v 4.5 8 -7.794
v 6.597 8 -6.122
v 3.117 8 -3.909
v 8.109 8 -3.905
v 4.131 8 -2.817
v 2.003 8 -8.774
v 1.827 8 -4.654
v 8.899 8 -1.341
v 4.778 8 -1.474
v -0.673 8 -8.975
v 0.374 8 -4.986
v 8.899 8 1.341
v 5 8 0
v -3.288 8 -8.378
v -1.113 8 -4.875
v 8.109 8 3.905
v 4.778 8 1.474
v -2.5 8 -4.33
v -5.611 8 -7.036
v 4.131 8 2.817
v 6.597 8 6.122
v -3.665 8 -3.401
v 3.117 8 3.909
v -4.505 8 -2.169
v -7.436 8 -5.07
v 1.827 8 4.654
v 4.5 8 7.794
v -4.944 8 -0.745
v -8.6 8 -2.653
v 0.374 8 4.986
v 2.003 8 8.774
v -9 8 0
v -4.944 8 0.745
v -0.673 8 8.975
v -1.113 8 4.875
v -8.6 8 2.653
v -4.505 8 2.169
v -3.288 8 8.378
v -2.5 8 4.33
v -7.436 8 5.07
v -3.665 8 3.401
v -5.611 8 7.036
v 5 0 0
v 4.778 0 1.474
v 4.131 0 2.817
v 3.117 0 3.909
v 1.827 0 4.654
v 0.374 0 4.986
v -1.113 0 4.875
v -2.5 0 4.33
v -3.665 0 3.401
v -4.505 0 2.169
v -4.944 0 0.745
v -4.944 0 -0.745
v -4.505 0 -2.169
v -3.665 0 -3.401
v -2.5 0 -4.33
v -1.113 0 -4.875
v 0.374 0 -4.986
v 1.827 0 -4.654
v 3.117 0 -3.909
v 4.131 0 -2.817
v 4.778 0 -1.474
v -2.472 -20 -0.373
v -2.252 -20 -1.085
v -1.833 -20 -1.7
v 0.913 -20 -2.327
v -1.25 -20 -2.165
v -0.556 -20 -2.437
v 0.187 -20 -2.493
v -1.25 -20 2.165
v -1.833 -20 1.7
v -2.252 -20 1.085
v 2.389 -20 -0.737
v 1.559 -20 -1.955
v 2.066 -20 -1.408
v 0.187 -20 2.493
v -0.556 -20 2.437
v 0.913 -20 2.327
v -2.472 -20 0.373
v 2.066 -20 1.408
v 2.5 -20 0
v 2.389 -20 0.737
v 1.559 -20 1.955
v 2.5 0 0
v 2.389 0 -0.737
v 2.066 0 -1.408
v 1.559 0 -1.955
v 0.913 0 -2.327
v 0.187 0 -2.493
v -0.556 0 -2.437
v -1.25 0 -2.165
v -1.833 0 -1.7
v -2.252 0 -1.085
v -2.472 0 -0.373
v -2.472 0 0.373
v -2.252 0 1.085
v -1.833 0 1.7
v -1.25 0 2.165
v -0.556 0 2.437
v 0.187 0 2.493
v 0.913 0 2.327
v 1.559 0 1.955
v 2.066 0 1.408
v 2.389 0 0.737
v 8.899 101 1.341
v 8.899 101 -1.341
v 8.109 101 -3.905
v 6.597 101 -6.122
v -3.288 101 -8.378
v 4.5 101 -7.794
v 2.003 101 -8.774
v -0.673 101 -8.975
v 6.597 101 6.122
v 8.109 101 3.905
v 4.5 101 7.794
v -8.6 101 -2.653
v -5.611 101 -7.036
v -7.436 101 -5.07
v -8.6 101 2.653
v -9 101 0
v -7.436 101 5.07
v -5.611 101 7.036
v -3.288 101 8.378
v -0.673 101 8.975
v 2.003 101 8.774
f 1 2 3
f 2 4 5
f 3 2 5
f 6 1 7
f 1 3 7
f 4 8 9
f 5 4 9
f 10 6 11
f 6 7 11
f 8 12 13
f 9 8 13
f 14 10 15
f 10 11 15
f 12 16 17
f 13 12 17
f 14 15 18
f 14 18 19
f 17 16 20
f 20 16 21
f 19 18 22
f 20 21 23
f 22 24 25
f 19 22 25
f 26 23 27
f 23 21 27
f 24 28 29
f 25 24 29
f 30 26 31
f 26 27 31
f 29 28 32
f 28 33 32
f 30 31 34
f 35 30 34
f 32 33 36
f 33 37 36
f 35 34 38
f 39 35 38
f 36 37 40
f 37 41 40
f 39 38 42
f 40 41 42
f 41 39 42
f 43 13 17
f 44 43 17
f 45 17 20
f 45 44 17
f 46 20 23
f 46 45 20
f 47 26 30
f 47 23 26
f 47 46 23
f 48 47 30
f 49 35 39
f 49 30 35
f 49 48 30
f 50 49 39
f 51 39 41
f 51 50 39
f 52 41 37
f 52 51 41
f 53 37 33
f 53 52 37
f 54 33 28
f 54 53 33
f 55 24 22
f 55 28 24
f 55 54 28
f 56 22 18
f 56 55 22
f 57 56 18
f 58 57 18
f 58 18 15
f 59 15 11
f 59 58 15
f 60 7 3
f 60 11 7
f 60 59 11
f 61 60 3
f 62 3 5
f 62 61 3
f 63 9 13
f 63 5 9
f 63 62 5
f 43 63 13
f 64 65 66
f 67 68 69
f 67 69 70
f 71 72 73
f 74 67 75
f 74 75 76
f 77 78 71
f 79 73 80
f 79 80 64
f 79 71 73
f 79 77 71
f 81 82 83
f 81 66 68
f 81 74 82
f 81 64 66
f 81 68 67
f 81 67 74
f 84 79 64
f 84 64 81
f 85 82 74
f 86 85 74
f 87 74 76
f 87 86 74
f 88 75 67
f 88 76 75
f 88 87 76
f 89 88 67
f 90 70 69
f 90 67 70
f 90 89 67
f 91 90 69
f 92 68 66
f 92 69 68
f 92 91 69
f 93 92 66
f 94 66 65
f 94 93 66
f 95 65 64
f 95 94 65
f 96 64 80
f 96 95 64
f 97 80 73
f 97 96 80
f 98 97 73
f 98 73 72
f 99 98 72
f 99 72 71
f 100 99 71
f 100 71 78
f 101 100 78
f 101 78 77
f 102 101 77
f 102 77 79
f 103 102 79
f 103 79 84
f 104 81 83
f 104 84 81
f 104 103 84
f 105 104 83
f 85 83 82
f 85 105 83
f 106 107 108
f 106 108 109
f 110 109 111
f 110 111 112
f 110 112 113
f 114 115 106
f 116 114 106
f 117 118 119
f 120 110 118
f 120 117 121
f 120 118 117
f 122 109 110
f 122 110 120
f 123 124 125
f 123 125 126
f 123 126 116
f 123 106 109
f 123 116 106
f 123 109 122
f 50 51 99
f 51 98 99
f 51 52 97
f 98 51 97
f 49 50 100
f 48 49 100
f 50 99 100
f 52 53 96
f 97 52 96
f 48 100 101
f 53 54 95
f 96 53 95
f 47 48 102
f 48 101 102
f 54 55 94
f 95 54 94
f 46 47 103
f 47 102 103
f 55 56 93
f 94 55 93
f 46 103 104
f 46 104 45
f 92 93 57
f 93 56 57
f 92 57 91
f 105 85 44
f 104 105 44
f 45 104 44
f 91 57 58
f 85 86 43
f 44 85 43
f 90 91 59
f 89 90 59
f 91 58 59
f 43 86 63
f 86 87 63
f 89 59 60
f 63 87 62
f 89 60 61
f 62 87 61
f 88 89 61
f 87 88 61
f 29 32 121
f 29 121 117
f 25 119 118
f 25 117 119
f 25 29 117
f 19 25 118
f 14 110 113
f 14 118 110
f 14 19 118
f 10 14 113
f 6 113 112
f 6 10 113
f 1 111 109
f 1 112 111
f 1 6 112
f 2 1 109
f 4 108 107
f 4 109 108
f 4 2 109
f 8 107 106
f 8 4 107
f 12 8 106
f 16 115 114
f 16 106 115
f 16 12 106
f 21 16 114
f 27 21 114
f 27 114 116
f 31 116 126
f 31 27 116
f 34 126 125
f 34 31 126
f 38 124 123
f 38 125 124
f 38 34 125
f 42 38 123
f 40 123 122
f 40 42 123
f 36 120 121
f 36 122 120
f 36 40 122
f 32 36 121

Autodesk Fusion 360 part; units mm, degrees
sketch "Esquisse1" plane through (0, 0, 0) normal (0, 1, 0) x (1, 0, 0)
  circle A0 centre (0, 0) radius 5
  dimension "d1" = 10
extrude "Extrusion1" add sketch "Esquisse1" along normal blind 8
sketch "Esquisse2" plane through (0, 8, 0) normal (0, 1, 0) x (-1, 0, 0)
  circle A0 centre (0, 0) radius 5
  circle A1 centre (0, 0) radius 9
  dimension "d4" = 18
extrude "Extrusion2" add sketch "Esquisse2" along normal blind 93 contours A0 | A1
sketch "Esquisse3" plane through (0, 0, 0) normal (0, -1, 0) x (1, 0, 0)
  circle A0 centre (0, 0) radius 5
  circle A1 centre (0, 0) radius 2.5
  dimension "d7" = 5
extrude "Extrusion3" add sketch "Esquisse3" along normal blind 20 contours A1
